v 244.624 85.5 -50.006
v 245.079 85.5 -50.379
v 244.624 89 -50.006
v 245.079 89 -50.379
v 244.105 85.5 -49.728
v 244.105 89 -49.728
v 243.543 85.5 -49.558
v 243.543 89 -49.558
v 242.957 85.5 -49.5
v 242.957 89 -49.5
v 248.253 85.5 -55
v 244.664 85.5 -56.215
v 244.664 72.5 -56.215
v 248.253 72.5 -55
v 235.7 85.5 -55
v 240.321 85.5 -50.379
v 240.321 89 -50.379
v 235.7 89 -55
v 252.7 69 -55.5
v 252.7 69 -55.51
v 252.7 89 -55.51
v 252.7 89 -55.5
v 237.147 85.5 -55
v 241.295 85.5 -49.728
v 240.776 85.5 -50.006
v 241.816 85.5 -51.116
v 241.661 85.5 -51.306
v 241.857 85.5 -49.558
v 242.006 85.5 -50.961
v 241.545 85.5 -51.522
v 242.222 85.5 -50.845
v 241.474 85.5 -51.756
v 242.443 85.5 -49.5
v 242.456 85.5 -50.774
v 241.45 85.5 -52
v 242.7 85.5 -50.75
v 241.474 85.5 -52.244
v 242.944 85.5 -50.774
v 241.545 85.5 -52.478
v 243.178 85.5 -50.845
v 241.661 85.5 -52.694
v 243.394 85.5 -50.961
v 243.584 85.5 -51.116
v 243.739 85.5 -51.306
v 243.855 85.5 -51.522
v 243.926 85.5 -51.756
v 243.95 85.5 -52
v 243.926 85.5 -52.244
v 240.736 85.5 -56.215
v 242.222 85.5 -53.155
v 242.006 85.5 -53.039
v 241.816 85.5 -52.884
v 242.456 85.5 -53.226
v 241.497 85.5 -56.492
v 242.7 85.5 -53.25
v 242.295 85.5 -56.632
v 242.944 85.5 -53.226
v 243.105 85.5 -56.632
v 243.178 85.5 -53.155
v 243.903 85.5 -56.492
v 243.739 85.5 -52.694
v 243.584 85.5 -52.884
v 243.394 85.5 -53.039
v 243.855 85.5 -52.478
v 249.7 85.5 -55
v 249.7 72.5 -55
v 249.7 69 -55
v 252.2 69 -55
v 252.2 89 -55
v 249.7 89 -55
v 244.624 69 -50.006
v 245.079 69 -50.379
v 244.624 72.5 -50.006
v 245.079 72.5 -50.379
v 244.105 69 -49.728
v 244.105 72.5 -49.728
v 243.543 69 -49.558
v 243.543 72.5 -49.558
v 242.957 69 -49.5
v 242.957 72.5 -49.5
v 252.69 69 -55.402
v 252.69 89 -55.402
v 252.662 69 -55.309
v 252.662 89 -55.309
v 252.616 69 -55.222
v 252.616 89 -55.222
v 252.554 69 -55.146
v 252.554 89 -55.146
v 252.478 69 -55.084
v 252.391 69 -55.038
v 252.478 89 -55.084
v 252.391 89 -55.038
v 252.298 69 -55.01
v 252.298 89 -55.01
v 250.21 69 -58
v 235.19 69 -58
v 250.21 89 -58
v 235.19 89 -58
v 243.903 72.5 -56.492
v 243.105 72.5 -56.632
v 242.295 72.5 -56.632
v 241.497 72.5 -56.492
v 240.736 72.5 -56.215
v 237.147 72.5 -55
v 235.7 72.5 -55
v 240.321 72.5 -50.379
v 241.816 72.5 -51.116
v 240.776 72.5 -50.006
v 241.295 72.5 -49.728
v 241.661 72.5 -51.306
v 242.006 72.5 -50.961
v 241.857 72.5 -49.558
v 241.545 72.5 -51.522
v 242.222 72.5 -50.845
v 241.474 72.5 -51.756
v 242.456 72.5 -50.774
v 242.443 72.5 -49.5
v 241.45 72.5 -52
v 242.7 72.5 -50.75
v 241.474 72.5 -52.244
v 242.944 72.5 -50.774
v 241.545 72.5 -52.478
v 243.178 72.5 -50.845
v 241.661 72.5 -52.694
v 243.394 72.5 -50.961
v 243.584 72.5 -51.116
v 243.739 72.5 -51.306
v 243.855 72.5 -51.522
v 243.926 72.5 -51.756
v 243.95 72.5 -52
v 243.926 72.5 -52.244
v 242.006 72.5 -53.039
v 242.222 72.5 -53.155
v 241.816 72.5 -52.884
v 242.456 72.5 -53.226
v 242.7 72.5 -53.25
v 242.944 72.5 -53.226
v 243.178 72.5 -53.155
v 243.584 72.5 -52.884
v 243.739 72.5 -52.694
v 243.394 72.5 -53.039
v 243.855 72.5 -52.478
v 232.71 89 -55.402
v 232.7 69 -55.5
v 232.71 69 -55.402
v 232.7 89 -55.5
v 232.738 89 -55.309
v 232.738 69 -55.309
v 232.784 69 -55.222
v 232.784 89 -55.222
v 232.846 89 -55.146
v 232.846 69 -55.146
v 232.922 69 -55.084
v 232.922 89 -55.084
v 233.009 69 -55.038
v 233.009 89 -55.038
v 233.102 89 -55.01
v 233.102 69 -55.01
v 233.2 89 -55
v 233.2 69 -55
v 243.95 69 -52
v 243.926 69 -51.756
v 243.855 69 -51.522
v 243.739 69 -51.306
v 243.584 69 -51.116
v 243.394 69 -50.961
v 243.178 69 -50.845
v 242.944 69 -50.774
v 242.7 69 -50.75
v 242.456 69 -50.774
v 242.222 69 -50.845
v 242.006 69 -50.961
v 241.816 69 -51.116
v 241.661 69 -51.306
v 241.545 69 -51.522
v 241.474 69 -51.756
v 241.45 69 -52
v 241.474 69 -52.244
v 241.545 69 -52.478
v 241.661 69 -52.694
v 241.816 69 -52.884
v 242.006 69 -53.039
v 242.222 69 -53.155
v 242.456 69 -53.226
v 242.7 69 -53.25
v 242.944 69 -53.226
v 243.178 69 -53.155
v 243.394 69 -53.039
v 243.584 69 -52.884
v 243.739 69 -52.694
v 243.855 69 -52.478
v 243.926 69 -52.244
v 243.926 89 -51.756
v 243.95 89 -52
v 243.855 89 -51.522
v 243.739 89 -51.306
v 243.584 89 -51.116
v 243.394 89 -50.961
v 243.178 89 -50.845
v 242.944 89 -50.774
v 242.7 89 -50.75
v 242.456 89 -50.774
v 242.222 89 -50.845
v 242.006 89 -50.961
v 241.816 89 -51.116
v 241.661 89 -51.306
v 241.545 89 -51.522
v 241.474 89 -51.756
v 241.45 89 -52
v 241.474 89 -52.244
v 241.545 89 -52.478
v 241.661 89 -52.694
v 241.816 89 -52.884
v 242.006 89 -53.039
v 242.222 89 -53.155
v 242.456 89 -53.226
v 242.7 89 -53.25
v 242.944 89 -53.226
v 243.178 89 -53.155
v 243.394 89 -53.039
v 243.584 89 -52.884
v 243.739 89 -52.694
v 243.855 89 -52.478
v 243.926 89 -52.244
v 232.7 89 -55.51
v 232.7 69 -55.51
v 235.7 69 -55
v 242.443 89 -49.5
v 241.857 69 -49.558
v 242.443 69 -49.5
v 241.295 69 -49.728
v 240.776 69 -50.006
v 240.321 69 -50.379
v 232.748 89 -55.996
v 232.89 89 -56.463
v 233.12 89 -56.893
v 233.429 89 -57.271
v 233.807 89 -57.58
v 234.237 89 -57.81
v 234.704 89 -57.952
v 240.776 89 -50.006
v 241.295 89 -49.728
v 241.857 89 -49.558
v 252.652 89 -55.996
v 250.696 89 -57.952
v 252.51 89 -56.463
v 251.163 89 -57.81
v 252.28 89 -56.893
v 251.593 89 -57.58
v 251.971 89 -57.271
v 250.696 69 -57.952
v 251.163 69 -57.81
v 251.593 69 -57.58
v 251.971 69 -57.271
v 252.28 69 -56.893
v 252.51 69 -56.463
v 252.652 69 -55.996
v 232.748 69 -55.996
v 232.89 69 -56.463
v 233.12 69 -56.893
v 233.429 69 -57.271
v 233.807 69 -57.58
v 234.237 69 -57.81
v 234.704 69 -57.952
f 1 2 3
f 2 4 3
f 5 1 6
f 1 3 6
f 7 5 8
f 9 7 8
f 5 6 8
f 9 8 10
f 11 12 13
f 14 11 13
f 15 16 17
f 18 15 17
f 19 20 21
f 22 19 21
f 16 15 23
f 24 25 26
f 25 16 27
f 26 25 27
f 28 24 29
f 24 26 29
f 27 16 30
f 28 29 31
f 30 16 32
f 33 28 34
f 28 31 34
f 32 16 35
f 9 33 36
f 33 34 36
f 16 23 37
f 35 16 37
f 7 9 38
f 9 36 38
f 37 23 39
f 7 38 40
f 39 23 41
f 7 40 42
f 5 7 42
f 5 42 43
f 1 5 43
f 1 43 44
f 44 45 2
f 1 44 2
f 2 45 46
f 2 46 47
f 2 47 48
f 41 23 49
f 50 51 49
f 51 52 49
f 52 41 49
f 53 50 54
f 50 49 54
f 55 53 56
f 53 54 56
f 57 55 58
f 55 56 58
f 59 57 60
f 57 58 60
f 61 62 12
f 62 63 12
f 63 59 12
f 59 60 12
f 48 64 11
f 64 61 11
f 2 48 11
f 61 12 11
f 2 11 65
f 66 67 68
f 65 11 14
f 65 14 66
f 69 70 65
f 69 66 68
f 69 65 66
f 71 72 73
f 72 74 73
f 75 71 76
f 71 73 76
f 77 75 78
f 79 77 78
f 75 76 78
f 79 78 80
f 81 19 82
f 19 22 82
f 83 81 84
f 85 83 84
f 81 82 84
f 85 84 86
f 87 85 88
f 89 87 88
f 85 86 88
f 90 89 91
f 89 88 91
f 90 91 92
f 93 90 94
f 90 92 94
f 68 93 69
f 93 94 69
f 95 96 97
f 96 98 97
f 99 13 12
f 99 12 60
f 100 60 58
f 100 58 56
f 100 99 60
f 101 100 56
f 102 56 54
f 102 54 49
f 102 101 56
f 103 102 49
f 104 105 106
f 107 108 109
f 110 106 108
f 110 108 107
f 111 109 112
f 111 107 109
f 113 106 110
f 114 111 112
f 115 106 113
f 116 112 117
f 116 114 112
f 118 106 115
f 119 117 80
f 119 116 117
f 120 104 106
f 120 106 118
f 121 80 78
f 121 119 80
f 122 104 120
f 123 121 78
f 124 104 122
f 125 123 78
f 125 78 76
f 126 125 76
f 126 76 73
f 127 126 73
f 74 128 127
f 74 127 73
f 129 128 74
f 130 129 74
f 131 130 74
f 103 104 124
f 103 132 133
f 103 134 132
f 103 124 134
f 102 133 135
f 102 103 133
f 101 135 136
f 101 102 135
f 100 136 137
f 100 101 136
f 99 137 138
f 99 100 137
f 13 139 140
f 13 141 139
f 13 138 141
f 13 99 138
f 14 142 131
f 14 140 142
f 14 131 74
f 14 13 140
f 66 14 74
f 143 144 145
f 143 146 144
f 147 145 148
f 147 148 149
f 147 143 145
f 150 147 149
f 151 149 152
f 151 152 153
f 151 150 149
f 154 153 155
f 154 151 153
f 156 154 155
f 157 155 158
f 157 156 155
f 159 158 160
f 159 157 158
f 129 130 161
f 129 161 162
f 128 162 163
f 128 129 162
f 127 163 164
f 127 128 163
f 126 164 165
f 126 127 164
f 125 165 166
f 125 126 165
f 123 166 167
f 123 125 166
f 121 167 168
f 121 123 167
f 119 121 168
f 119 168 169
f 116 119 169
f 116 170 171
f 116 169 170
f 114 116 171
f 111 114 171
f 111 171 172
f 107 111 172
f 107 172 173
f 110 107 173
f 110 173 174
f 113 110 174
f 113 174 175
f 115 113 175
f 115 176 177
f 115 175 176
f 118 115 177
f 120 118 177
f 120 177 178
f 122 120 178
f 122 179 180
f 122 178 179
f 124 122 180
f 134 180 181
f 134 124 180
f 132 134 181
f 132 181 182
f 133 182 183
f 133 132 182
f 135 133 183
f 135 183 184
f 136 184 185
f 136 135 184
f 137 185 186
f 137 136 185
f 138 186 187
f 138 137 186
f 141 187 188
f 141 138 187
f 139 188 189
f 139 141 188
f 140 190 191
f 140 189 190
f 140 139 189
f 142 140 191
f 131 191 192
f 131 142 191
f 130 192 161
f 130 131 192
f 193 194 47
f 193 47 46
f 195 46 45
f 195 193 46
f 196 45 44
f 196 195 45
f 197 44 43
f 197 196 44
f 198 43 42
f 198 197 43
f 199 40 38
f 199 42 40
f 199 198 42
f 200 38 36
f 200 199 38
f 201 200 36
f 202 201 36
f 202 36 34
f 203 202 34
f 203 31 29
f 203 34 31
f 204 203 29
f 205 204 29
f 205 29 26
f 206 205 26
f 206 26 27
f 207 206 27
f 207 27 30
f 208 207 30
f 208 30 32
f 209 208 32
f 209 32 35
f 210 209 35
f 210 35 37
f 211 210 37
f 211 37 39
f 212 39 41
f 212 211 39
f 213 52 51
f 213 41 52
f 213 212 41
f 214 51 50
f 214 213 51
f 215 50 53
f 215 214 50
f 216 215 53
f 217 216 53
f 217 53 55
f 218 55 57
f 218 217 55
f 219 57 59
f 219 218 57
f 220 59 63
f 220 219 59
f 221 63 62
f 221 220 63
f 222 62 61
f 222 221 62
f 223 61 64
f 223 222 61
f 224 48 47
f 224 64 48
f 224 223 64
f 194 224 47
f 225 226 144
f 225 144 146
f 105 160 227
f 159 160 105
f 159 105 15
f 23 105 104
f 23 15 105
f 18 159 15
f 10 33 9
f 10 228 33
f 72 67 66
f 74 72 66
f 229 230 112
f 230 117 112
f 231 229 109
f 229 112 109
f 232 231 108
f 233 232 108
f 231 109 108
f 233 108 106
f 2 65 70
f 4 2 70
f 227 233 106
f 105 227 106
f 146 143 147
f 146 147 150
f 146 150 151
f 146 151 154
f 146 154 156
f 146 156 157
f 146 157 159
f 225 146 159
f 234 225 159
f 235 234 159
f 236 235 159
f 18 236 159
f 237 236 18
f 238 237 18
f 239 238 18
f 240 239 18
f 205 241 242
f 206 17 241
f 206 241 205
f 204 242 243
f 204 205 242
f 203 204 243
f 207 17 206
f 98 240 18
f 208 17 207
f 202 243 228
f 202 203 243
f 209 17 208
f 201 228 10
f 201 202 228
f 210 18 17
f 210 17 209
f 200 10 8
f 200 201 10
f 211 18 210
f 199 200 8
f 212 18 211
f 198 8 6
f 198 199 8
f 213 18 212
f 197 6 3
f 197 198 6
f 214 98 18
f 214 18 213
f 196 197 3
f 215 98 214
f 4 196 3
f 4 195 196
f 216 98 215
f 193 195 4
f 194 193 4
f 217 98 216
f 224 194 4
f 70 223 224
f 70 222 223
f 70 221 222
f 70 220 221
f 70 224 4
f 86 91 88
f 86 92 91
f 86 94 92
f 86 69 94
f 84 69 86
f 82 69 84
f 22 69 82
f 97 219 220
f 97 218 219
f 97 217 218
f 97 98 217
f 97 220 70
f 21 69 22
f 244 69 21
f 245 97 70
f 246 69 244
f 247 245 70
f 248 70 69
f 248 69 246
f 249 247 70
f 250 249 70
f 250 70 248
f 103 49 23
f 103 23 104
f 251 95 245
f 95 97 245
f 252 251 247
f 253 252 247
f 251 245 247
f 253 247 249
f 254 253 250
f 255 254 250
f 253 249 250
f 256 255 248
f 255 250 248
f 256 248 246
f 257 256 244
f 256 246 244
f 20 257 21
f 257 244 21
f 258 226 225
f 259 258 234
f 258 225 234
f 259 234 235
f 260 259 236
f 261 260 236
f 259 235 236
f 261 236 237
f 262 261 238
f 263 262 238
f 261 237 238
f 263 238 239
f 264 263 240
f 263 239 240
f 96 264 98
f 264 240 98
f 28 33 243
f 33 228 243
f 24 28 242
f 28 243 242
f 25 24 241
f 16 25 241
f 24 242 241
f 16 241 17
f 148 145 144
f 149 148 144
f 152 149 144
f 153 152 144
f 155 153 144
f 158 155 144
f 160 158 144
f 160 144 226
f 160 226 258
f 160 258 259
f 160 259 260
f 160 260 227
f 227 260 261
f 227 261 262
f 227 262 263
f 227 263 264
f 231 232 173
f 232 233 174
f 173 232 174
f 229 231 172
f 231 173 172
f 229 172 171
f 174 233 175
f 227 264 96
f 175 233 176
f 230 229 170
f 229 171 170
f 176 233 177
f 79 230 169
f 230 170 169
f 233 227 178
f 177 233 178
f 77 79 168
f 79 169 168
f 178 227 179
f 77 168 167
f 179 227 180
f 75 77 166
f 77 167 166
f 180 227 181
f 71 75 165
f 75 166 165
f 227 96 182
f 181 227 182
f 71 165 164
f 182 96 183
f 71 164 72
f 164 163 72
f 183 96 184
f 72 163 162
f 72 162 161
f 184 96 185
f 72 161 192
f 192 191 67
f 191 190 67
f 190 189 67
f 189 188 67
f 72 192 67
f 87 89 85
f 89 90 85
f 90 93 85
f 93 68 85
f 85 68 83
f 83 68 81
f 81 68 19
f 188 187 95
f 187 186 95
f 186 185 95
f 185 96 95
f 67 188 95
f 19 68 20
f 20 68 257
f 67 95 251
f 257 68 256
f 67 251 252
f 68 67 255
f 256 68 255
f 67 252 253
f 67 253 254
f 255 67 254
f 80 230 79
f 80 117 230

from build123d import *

# Parameters (mm, degrees)
CYLINDER222_R     = 1.25
CYLINDER222_DEPTH = 22
CYLINDER221_R     = 4.65
CYLINDER221_DEPTH = 13
BOX148_W          = 20
BOX148_H          = 20
BOX148_DEPTH      = 3
CHAMFER007_SIZE   = 2
BOX149_W          = 16
BOX149_H          = 3.5
BOX149_DEPTH      = 8.5
CHAMFER008_SIZE   = 6.5
BOX147_W          = 16
BOX147_H          = 3.5
BOX147_DEPTH      = 8.5
CHAMFER006_SIZE   = 6.5
FILLET064_R       = 3
FILLET063_R       = 2.49
FILLET062_R       = 0.5


with BuildPart() as cylinder494:
    # Cylinder222 → Cylinder222 (new body)
    with BuildSketch(Plane(origin=(320, 13, -68), x_dir=(1, 0, 0), z_dir=(0, -1, 0))):
        Circle(CYLINDER222_R)
    extrude(amount=CYLINDER222_DEPTH)


with BuildPart() as cylinder493:
    # Cylinder221 → Cylinder221 (new body)
    with BuildSketch(Plane(origin=(320, -4.5, -68), x_dir=(1, 0, 0), z_dir=(0, 1, 0))):
        Circle(CYLINDER221_R)
    extrude(amount=CYLINDER221_DEPTH)


with BuildPart() as chamfer007:
    # Box148 → Box148 (new body)
    with BuildSketch(Plane(origin=(310, -8, -74), x_dir=(1, 0, 0), z_dir=(0, 0, 1))):
        with Locations((10, 10)):
            Rectangle(BOX148_W, BOX148_H)
    extrude(amount=BOX148_DEPTH)

    # Cut156: cut Cylinder493
    add(cylinder493.part, mode=Mode.SUBTRACT)

    # Chamfer007
    chamfer007_edges = [chamfer007.edges().sort_by_distance(p)[0] for p in [
        (323.552816, 2, -71),
        (316.447184, 2, -71),
    ]]
    chamfer(chamfer007_edges, length=CHAMFER007_SIZE)


with BuildPart() as chamfer008:
    # Box149 → Box149 (new body)
    with BuildSketch(Plane(origin=(311, 8.5, -74), x_dir=(1, 0, 0), z_dir=(0, 0, 1))):
        with Locations((8, 1.75)):
            Rectangle(BOX149_W, BOX149_H)
    extrude(amount=BOX149_DEPTH)

    # Chamfer008
    chamfer008_edges = [chamfer008.edges().sort_by_distance(p)[0] for p in [
        (311, 10.25, -65.5),
        (327, 10.25, -65.5),
    ]]
    chamfer(chamfer008_edges, length=CHAMFER008_SIZE)


with BuildPart() as chamfer008_1:
    # Chamfer008 placement: moved
    add(chamfer008.part.moved(Location((1, 0, 0))))


with BuildPart() as supports_right_foot:
    # Box147 → Box147 (new body)
    with BuildSketch(Plane(origin=(311, 8.5, -74), x_dir=(1, 0, 0), z_dir=(0, 0, 1))):
        with Locations((8, 1.75)):
            Rectangle(BOX147_W, BOX147_H)
    extrude(amount=BOX147_DEPTH)

    # Chamfer006
    chamfer006_edges = [supports_right_foot.edges().sort_by_distance(p)[0] for p in [
        (311, 10.25, -65.5),
        (327, 10.25, -65.5),
    ]]
    chamfer(chamfer006_edges, length=CHAMFER006_SIZE)


with BuildPart() as supports_right_foot_1:
    # Chamfer006 placement: moved
    add(supports_right_foot.part.moved(Location((1, -16.5, 0))))

    # Fusion190: union Chamfer007, Chamfer008
    add(chamfer007.part)
    add(chamfer008_1.part)

    # Fillet064
    fillet064_edges = [supports_right_foot_1.edges().sort_by_distance(p)[0] for p in [
        (318.5, -6.25, -65.5),
        (321.5, -6.25, -65.5),
        (318.5, 10.25, -65.5),
        (321.5, 10.25, -65.5),
    ]]
    fillet(fillet064_edges, radius=FILLET064_R)

    # Fillet063
    fillet063_edges = [supports_right_foot_1.edges().sort_by_distance(p)[0] for p in [
        (330, 2, -74),
        (310, 2, -74),
    ]]
    fillet(fillet063_edges, radius=FILLET063_R)

    # Fillet062
    fillet062_edges = [supports_right_foot_1.edges().sort_by_distance(p)[0] for p in [
        (330, 2, -71),
        (310, 2, -71),
    ]]
    fillet(fillet062_edges, radius=FILLET062_R)

    # Cut155: cut Cylinder494
    add(cylinder494.part, mode=Mode.SUBTRACT)


with BuildPart() as supports_right_foot_2:
    # Cut155 placement: moved
    add(supports_right_foot_1.part.moved(Location((-77.3, 77, 16))))


solid = supports_right_foot_2.part
